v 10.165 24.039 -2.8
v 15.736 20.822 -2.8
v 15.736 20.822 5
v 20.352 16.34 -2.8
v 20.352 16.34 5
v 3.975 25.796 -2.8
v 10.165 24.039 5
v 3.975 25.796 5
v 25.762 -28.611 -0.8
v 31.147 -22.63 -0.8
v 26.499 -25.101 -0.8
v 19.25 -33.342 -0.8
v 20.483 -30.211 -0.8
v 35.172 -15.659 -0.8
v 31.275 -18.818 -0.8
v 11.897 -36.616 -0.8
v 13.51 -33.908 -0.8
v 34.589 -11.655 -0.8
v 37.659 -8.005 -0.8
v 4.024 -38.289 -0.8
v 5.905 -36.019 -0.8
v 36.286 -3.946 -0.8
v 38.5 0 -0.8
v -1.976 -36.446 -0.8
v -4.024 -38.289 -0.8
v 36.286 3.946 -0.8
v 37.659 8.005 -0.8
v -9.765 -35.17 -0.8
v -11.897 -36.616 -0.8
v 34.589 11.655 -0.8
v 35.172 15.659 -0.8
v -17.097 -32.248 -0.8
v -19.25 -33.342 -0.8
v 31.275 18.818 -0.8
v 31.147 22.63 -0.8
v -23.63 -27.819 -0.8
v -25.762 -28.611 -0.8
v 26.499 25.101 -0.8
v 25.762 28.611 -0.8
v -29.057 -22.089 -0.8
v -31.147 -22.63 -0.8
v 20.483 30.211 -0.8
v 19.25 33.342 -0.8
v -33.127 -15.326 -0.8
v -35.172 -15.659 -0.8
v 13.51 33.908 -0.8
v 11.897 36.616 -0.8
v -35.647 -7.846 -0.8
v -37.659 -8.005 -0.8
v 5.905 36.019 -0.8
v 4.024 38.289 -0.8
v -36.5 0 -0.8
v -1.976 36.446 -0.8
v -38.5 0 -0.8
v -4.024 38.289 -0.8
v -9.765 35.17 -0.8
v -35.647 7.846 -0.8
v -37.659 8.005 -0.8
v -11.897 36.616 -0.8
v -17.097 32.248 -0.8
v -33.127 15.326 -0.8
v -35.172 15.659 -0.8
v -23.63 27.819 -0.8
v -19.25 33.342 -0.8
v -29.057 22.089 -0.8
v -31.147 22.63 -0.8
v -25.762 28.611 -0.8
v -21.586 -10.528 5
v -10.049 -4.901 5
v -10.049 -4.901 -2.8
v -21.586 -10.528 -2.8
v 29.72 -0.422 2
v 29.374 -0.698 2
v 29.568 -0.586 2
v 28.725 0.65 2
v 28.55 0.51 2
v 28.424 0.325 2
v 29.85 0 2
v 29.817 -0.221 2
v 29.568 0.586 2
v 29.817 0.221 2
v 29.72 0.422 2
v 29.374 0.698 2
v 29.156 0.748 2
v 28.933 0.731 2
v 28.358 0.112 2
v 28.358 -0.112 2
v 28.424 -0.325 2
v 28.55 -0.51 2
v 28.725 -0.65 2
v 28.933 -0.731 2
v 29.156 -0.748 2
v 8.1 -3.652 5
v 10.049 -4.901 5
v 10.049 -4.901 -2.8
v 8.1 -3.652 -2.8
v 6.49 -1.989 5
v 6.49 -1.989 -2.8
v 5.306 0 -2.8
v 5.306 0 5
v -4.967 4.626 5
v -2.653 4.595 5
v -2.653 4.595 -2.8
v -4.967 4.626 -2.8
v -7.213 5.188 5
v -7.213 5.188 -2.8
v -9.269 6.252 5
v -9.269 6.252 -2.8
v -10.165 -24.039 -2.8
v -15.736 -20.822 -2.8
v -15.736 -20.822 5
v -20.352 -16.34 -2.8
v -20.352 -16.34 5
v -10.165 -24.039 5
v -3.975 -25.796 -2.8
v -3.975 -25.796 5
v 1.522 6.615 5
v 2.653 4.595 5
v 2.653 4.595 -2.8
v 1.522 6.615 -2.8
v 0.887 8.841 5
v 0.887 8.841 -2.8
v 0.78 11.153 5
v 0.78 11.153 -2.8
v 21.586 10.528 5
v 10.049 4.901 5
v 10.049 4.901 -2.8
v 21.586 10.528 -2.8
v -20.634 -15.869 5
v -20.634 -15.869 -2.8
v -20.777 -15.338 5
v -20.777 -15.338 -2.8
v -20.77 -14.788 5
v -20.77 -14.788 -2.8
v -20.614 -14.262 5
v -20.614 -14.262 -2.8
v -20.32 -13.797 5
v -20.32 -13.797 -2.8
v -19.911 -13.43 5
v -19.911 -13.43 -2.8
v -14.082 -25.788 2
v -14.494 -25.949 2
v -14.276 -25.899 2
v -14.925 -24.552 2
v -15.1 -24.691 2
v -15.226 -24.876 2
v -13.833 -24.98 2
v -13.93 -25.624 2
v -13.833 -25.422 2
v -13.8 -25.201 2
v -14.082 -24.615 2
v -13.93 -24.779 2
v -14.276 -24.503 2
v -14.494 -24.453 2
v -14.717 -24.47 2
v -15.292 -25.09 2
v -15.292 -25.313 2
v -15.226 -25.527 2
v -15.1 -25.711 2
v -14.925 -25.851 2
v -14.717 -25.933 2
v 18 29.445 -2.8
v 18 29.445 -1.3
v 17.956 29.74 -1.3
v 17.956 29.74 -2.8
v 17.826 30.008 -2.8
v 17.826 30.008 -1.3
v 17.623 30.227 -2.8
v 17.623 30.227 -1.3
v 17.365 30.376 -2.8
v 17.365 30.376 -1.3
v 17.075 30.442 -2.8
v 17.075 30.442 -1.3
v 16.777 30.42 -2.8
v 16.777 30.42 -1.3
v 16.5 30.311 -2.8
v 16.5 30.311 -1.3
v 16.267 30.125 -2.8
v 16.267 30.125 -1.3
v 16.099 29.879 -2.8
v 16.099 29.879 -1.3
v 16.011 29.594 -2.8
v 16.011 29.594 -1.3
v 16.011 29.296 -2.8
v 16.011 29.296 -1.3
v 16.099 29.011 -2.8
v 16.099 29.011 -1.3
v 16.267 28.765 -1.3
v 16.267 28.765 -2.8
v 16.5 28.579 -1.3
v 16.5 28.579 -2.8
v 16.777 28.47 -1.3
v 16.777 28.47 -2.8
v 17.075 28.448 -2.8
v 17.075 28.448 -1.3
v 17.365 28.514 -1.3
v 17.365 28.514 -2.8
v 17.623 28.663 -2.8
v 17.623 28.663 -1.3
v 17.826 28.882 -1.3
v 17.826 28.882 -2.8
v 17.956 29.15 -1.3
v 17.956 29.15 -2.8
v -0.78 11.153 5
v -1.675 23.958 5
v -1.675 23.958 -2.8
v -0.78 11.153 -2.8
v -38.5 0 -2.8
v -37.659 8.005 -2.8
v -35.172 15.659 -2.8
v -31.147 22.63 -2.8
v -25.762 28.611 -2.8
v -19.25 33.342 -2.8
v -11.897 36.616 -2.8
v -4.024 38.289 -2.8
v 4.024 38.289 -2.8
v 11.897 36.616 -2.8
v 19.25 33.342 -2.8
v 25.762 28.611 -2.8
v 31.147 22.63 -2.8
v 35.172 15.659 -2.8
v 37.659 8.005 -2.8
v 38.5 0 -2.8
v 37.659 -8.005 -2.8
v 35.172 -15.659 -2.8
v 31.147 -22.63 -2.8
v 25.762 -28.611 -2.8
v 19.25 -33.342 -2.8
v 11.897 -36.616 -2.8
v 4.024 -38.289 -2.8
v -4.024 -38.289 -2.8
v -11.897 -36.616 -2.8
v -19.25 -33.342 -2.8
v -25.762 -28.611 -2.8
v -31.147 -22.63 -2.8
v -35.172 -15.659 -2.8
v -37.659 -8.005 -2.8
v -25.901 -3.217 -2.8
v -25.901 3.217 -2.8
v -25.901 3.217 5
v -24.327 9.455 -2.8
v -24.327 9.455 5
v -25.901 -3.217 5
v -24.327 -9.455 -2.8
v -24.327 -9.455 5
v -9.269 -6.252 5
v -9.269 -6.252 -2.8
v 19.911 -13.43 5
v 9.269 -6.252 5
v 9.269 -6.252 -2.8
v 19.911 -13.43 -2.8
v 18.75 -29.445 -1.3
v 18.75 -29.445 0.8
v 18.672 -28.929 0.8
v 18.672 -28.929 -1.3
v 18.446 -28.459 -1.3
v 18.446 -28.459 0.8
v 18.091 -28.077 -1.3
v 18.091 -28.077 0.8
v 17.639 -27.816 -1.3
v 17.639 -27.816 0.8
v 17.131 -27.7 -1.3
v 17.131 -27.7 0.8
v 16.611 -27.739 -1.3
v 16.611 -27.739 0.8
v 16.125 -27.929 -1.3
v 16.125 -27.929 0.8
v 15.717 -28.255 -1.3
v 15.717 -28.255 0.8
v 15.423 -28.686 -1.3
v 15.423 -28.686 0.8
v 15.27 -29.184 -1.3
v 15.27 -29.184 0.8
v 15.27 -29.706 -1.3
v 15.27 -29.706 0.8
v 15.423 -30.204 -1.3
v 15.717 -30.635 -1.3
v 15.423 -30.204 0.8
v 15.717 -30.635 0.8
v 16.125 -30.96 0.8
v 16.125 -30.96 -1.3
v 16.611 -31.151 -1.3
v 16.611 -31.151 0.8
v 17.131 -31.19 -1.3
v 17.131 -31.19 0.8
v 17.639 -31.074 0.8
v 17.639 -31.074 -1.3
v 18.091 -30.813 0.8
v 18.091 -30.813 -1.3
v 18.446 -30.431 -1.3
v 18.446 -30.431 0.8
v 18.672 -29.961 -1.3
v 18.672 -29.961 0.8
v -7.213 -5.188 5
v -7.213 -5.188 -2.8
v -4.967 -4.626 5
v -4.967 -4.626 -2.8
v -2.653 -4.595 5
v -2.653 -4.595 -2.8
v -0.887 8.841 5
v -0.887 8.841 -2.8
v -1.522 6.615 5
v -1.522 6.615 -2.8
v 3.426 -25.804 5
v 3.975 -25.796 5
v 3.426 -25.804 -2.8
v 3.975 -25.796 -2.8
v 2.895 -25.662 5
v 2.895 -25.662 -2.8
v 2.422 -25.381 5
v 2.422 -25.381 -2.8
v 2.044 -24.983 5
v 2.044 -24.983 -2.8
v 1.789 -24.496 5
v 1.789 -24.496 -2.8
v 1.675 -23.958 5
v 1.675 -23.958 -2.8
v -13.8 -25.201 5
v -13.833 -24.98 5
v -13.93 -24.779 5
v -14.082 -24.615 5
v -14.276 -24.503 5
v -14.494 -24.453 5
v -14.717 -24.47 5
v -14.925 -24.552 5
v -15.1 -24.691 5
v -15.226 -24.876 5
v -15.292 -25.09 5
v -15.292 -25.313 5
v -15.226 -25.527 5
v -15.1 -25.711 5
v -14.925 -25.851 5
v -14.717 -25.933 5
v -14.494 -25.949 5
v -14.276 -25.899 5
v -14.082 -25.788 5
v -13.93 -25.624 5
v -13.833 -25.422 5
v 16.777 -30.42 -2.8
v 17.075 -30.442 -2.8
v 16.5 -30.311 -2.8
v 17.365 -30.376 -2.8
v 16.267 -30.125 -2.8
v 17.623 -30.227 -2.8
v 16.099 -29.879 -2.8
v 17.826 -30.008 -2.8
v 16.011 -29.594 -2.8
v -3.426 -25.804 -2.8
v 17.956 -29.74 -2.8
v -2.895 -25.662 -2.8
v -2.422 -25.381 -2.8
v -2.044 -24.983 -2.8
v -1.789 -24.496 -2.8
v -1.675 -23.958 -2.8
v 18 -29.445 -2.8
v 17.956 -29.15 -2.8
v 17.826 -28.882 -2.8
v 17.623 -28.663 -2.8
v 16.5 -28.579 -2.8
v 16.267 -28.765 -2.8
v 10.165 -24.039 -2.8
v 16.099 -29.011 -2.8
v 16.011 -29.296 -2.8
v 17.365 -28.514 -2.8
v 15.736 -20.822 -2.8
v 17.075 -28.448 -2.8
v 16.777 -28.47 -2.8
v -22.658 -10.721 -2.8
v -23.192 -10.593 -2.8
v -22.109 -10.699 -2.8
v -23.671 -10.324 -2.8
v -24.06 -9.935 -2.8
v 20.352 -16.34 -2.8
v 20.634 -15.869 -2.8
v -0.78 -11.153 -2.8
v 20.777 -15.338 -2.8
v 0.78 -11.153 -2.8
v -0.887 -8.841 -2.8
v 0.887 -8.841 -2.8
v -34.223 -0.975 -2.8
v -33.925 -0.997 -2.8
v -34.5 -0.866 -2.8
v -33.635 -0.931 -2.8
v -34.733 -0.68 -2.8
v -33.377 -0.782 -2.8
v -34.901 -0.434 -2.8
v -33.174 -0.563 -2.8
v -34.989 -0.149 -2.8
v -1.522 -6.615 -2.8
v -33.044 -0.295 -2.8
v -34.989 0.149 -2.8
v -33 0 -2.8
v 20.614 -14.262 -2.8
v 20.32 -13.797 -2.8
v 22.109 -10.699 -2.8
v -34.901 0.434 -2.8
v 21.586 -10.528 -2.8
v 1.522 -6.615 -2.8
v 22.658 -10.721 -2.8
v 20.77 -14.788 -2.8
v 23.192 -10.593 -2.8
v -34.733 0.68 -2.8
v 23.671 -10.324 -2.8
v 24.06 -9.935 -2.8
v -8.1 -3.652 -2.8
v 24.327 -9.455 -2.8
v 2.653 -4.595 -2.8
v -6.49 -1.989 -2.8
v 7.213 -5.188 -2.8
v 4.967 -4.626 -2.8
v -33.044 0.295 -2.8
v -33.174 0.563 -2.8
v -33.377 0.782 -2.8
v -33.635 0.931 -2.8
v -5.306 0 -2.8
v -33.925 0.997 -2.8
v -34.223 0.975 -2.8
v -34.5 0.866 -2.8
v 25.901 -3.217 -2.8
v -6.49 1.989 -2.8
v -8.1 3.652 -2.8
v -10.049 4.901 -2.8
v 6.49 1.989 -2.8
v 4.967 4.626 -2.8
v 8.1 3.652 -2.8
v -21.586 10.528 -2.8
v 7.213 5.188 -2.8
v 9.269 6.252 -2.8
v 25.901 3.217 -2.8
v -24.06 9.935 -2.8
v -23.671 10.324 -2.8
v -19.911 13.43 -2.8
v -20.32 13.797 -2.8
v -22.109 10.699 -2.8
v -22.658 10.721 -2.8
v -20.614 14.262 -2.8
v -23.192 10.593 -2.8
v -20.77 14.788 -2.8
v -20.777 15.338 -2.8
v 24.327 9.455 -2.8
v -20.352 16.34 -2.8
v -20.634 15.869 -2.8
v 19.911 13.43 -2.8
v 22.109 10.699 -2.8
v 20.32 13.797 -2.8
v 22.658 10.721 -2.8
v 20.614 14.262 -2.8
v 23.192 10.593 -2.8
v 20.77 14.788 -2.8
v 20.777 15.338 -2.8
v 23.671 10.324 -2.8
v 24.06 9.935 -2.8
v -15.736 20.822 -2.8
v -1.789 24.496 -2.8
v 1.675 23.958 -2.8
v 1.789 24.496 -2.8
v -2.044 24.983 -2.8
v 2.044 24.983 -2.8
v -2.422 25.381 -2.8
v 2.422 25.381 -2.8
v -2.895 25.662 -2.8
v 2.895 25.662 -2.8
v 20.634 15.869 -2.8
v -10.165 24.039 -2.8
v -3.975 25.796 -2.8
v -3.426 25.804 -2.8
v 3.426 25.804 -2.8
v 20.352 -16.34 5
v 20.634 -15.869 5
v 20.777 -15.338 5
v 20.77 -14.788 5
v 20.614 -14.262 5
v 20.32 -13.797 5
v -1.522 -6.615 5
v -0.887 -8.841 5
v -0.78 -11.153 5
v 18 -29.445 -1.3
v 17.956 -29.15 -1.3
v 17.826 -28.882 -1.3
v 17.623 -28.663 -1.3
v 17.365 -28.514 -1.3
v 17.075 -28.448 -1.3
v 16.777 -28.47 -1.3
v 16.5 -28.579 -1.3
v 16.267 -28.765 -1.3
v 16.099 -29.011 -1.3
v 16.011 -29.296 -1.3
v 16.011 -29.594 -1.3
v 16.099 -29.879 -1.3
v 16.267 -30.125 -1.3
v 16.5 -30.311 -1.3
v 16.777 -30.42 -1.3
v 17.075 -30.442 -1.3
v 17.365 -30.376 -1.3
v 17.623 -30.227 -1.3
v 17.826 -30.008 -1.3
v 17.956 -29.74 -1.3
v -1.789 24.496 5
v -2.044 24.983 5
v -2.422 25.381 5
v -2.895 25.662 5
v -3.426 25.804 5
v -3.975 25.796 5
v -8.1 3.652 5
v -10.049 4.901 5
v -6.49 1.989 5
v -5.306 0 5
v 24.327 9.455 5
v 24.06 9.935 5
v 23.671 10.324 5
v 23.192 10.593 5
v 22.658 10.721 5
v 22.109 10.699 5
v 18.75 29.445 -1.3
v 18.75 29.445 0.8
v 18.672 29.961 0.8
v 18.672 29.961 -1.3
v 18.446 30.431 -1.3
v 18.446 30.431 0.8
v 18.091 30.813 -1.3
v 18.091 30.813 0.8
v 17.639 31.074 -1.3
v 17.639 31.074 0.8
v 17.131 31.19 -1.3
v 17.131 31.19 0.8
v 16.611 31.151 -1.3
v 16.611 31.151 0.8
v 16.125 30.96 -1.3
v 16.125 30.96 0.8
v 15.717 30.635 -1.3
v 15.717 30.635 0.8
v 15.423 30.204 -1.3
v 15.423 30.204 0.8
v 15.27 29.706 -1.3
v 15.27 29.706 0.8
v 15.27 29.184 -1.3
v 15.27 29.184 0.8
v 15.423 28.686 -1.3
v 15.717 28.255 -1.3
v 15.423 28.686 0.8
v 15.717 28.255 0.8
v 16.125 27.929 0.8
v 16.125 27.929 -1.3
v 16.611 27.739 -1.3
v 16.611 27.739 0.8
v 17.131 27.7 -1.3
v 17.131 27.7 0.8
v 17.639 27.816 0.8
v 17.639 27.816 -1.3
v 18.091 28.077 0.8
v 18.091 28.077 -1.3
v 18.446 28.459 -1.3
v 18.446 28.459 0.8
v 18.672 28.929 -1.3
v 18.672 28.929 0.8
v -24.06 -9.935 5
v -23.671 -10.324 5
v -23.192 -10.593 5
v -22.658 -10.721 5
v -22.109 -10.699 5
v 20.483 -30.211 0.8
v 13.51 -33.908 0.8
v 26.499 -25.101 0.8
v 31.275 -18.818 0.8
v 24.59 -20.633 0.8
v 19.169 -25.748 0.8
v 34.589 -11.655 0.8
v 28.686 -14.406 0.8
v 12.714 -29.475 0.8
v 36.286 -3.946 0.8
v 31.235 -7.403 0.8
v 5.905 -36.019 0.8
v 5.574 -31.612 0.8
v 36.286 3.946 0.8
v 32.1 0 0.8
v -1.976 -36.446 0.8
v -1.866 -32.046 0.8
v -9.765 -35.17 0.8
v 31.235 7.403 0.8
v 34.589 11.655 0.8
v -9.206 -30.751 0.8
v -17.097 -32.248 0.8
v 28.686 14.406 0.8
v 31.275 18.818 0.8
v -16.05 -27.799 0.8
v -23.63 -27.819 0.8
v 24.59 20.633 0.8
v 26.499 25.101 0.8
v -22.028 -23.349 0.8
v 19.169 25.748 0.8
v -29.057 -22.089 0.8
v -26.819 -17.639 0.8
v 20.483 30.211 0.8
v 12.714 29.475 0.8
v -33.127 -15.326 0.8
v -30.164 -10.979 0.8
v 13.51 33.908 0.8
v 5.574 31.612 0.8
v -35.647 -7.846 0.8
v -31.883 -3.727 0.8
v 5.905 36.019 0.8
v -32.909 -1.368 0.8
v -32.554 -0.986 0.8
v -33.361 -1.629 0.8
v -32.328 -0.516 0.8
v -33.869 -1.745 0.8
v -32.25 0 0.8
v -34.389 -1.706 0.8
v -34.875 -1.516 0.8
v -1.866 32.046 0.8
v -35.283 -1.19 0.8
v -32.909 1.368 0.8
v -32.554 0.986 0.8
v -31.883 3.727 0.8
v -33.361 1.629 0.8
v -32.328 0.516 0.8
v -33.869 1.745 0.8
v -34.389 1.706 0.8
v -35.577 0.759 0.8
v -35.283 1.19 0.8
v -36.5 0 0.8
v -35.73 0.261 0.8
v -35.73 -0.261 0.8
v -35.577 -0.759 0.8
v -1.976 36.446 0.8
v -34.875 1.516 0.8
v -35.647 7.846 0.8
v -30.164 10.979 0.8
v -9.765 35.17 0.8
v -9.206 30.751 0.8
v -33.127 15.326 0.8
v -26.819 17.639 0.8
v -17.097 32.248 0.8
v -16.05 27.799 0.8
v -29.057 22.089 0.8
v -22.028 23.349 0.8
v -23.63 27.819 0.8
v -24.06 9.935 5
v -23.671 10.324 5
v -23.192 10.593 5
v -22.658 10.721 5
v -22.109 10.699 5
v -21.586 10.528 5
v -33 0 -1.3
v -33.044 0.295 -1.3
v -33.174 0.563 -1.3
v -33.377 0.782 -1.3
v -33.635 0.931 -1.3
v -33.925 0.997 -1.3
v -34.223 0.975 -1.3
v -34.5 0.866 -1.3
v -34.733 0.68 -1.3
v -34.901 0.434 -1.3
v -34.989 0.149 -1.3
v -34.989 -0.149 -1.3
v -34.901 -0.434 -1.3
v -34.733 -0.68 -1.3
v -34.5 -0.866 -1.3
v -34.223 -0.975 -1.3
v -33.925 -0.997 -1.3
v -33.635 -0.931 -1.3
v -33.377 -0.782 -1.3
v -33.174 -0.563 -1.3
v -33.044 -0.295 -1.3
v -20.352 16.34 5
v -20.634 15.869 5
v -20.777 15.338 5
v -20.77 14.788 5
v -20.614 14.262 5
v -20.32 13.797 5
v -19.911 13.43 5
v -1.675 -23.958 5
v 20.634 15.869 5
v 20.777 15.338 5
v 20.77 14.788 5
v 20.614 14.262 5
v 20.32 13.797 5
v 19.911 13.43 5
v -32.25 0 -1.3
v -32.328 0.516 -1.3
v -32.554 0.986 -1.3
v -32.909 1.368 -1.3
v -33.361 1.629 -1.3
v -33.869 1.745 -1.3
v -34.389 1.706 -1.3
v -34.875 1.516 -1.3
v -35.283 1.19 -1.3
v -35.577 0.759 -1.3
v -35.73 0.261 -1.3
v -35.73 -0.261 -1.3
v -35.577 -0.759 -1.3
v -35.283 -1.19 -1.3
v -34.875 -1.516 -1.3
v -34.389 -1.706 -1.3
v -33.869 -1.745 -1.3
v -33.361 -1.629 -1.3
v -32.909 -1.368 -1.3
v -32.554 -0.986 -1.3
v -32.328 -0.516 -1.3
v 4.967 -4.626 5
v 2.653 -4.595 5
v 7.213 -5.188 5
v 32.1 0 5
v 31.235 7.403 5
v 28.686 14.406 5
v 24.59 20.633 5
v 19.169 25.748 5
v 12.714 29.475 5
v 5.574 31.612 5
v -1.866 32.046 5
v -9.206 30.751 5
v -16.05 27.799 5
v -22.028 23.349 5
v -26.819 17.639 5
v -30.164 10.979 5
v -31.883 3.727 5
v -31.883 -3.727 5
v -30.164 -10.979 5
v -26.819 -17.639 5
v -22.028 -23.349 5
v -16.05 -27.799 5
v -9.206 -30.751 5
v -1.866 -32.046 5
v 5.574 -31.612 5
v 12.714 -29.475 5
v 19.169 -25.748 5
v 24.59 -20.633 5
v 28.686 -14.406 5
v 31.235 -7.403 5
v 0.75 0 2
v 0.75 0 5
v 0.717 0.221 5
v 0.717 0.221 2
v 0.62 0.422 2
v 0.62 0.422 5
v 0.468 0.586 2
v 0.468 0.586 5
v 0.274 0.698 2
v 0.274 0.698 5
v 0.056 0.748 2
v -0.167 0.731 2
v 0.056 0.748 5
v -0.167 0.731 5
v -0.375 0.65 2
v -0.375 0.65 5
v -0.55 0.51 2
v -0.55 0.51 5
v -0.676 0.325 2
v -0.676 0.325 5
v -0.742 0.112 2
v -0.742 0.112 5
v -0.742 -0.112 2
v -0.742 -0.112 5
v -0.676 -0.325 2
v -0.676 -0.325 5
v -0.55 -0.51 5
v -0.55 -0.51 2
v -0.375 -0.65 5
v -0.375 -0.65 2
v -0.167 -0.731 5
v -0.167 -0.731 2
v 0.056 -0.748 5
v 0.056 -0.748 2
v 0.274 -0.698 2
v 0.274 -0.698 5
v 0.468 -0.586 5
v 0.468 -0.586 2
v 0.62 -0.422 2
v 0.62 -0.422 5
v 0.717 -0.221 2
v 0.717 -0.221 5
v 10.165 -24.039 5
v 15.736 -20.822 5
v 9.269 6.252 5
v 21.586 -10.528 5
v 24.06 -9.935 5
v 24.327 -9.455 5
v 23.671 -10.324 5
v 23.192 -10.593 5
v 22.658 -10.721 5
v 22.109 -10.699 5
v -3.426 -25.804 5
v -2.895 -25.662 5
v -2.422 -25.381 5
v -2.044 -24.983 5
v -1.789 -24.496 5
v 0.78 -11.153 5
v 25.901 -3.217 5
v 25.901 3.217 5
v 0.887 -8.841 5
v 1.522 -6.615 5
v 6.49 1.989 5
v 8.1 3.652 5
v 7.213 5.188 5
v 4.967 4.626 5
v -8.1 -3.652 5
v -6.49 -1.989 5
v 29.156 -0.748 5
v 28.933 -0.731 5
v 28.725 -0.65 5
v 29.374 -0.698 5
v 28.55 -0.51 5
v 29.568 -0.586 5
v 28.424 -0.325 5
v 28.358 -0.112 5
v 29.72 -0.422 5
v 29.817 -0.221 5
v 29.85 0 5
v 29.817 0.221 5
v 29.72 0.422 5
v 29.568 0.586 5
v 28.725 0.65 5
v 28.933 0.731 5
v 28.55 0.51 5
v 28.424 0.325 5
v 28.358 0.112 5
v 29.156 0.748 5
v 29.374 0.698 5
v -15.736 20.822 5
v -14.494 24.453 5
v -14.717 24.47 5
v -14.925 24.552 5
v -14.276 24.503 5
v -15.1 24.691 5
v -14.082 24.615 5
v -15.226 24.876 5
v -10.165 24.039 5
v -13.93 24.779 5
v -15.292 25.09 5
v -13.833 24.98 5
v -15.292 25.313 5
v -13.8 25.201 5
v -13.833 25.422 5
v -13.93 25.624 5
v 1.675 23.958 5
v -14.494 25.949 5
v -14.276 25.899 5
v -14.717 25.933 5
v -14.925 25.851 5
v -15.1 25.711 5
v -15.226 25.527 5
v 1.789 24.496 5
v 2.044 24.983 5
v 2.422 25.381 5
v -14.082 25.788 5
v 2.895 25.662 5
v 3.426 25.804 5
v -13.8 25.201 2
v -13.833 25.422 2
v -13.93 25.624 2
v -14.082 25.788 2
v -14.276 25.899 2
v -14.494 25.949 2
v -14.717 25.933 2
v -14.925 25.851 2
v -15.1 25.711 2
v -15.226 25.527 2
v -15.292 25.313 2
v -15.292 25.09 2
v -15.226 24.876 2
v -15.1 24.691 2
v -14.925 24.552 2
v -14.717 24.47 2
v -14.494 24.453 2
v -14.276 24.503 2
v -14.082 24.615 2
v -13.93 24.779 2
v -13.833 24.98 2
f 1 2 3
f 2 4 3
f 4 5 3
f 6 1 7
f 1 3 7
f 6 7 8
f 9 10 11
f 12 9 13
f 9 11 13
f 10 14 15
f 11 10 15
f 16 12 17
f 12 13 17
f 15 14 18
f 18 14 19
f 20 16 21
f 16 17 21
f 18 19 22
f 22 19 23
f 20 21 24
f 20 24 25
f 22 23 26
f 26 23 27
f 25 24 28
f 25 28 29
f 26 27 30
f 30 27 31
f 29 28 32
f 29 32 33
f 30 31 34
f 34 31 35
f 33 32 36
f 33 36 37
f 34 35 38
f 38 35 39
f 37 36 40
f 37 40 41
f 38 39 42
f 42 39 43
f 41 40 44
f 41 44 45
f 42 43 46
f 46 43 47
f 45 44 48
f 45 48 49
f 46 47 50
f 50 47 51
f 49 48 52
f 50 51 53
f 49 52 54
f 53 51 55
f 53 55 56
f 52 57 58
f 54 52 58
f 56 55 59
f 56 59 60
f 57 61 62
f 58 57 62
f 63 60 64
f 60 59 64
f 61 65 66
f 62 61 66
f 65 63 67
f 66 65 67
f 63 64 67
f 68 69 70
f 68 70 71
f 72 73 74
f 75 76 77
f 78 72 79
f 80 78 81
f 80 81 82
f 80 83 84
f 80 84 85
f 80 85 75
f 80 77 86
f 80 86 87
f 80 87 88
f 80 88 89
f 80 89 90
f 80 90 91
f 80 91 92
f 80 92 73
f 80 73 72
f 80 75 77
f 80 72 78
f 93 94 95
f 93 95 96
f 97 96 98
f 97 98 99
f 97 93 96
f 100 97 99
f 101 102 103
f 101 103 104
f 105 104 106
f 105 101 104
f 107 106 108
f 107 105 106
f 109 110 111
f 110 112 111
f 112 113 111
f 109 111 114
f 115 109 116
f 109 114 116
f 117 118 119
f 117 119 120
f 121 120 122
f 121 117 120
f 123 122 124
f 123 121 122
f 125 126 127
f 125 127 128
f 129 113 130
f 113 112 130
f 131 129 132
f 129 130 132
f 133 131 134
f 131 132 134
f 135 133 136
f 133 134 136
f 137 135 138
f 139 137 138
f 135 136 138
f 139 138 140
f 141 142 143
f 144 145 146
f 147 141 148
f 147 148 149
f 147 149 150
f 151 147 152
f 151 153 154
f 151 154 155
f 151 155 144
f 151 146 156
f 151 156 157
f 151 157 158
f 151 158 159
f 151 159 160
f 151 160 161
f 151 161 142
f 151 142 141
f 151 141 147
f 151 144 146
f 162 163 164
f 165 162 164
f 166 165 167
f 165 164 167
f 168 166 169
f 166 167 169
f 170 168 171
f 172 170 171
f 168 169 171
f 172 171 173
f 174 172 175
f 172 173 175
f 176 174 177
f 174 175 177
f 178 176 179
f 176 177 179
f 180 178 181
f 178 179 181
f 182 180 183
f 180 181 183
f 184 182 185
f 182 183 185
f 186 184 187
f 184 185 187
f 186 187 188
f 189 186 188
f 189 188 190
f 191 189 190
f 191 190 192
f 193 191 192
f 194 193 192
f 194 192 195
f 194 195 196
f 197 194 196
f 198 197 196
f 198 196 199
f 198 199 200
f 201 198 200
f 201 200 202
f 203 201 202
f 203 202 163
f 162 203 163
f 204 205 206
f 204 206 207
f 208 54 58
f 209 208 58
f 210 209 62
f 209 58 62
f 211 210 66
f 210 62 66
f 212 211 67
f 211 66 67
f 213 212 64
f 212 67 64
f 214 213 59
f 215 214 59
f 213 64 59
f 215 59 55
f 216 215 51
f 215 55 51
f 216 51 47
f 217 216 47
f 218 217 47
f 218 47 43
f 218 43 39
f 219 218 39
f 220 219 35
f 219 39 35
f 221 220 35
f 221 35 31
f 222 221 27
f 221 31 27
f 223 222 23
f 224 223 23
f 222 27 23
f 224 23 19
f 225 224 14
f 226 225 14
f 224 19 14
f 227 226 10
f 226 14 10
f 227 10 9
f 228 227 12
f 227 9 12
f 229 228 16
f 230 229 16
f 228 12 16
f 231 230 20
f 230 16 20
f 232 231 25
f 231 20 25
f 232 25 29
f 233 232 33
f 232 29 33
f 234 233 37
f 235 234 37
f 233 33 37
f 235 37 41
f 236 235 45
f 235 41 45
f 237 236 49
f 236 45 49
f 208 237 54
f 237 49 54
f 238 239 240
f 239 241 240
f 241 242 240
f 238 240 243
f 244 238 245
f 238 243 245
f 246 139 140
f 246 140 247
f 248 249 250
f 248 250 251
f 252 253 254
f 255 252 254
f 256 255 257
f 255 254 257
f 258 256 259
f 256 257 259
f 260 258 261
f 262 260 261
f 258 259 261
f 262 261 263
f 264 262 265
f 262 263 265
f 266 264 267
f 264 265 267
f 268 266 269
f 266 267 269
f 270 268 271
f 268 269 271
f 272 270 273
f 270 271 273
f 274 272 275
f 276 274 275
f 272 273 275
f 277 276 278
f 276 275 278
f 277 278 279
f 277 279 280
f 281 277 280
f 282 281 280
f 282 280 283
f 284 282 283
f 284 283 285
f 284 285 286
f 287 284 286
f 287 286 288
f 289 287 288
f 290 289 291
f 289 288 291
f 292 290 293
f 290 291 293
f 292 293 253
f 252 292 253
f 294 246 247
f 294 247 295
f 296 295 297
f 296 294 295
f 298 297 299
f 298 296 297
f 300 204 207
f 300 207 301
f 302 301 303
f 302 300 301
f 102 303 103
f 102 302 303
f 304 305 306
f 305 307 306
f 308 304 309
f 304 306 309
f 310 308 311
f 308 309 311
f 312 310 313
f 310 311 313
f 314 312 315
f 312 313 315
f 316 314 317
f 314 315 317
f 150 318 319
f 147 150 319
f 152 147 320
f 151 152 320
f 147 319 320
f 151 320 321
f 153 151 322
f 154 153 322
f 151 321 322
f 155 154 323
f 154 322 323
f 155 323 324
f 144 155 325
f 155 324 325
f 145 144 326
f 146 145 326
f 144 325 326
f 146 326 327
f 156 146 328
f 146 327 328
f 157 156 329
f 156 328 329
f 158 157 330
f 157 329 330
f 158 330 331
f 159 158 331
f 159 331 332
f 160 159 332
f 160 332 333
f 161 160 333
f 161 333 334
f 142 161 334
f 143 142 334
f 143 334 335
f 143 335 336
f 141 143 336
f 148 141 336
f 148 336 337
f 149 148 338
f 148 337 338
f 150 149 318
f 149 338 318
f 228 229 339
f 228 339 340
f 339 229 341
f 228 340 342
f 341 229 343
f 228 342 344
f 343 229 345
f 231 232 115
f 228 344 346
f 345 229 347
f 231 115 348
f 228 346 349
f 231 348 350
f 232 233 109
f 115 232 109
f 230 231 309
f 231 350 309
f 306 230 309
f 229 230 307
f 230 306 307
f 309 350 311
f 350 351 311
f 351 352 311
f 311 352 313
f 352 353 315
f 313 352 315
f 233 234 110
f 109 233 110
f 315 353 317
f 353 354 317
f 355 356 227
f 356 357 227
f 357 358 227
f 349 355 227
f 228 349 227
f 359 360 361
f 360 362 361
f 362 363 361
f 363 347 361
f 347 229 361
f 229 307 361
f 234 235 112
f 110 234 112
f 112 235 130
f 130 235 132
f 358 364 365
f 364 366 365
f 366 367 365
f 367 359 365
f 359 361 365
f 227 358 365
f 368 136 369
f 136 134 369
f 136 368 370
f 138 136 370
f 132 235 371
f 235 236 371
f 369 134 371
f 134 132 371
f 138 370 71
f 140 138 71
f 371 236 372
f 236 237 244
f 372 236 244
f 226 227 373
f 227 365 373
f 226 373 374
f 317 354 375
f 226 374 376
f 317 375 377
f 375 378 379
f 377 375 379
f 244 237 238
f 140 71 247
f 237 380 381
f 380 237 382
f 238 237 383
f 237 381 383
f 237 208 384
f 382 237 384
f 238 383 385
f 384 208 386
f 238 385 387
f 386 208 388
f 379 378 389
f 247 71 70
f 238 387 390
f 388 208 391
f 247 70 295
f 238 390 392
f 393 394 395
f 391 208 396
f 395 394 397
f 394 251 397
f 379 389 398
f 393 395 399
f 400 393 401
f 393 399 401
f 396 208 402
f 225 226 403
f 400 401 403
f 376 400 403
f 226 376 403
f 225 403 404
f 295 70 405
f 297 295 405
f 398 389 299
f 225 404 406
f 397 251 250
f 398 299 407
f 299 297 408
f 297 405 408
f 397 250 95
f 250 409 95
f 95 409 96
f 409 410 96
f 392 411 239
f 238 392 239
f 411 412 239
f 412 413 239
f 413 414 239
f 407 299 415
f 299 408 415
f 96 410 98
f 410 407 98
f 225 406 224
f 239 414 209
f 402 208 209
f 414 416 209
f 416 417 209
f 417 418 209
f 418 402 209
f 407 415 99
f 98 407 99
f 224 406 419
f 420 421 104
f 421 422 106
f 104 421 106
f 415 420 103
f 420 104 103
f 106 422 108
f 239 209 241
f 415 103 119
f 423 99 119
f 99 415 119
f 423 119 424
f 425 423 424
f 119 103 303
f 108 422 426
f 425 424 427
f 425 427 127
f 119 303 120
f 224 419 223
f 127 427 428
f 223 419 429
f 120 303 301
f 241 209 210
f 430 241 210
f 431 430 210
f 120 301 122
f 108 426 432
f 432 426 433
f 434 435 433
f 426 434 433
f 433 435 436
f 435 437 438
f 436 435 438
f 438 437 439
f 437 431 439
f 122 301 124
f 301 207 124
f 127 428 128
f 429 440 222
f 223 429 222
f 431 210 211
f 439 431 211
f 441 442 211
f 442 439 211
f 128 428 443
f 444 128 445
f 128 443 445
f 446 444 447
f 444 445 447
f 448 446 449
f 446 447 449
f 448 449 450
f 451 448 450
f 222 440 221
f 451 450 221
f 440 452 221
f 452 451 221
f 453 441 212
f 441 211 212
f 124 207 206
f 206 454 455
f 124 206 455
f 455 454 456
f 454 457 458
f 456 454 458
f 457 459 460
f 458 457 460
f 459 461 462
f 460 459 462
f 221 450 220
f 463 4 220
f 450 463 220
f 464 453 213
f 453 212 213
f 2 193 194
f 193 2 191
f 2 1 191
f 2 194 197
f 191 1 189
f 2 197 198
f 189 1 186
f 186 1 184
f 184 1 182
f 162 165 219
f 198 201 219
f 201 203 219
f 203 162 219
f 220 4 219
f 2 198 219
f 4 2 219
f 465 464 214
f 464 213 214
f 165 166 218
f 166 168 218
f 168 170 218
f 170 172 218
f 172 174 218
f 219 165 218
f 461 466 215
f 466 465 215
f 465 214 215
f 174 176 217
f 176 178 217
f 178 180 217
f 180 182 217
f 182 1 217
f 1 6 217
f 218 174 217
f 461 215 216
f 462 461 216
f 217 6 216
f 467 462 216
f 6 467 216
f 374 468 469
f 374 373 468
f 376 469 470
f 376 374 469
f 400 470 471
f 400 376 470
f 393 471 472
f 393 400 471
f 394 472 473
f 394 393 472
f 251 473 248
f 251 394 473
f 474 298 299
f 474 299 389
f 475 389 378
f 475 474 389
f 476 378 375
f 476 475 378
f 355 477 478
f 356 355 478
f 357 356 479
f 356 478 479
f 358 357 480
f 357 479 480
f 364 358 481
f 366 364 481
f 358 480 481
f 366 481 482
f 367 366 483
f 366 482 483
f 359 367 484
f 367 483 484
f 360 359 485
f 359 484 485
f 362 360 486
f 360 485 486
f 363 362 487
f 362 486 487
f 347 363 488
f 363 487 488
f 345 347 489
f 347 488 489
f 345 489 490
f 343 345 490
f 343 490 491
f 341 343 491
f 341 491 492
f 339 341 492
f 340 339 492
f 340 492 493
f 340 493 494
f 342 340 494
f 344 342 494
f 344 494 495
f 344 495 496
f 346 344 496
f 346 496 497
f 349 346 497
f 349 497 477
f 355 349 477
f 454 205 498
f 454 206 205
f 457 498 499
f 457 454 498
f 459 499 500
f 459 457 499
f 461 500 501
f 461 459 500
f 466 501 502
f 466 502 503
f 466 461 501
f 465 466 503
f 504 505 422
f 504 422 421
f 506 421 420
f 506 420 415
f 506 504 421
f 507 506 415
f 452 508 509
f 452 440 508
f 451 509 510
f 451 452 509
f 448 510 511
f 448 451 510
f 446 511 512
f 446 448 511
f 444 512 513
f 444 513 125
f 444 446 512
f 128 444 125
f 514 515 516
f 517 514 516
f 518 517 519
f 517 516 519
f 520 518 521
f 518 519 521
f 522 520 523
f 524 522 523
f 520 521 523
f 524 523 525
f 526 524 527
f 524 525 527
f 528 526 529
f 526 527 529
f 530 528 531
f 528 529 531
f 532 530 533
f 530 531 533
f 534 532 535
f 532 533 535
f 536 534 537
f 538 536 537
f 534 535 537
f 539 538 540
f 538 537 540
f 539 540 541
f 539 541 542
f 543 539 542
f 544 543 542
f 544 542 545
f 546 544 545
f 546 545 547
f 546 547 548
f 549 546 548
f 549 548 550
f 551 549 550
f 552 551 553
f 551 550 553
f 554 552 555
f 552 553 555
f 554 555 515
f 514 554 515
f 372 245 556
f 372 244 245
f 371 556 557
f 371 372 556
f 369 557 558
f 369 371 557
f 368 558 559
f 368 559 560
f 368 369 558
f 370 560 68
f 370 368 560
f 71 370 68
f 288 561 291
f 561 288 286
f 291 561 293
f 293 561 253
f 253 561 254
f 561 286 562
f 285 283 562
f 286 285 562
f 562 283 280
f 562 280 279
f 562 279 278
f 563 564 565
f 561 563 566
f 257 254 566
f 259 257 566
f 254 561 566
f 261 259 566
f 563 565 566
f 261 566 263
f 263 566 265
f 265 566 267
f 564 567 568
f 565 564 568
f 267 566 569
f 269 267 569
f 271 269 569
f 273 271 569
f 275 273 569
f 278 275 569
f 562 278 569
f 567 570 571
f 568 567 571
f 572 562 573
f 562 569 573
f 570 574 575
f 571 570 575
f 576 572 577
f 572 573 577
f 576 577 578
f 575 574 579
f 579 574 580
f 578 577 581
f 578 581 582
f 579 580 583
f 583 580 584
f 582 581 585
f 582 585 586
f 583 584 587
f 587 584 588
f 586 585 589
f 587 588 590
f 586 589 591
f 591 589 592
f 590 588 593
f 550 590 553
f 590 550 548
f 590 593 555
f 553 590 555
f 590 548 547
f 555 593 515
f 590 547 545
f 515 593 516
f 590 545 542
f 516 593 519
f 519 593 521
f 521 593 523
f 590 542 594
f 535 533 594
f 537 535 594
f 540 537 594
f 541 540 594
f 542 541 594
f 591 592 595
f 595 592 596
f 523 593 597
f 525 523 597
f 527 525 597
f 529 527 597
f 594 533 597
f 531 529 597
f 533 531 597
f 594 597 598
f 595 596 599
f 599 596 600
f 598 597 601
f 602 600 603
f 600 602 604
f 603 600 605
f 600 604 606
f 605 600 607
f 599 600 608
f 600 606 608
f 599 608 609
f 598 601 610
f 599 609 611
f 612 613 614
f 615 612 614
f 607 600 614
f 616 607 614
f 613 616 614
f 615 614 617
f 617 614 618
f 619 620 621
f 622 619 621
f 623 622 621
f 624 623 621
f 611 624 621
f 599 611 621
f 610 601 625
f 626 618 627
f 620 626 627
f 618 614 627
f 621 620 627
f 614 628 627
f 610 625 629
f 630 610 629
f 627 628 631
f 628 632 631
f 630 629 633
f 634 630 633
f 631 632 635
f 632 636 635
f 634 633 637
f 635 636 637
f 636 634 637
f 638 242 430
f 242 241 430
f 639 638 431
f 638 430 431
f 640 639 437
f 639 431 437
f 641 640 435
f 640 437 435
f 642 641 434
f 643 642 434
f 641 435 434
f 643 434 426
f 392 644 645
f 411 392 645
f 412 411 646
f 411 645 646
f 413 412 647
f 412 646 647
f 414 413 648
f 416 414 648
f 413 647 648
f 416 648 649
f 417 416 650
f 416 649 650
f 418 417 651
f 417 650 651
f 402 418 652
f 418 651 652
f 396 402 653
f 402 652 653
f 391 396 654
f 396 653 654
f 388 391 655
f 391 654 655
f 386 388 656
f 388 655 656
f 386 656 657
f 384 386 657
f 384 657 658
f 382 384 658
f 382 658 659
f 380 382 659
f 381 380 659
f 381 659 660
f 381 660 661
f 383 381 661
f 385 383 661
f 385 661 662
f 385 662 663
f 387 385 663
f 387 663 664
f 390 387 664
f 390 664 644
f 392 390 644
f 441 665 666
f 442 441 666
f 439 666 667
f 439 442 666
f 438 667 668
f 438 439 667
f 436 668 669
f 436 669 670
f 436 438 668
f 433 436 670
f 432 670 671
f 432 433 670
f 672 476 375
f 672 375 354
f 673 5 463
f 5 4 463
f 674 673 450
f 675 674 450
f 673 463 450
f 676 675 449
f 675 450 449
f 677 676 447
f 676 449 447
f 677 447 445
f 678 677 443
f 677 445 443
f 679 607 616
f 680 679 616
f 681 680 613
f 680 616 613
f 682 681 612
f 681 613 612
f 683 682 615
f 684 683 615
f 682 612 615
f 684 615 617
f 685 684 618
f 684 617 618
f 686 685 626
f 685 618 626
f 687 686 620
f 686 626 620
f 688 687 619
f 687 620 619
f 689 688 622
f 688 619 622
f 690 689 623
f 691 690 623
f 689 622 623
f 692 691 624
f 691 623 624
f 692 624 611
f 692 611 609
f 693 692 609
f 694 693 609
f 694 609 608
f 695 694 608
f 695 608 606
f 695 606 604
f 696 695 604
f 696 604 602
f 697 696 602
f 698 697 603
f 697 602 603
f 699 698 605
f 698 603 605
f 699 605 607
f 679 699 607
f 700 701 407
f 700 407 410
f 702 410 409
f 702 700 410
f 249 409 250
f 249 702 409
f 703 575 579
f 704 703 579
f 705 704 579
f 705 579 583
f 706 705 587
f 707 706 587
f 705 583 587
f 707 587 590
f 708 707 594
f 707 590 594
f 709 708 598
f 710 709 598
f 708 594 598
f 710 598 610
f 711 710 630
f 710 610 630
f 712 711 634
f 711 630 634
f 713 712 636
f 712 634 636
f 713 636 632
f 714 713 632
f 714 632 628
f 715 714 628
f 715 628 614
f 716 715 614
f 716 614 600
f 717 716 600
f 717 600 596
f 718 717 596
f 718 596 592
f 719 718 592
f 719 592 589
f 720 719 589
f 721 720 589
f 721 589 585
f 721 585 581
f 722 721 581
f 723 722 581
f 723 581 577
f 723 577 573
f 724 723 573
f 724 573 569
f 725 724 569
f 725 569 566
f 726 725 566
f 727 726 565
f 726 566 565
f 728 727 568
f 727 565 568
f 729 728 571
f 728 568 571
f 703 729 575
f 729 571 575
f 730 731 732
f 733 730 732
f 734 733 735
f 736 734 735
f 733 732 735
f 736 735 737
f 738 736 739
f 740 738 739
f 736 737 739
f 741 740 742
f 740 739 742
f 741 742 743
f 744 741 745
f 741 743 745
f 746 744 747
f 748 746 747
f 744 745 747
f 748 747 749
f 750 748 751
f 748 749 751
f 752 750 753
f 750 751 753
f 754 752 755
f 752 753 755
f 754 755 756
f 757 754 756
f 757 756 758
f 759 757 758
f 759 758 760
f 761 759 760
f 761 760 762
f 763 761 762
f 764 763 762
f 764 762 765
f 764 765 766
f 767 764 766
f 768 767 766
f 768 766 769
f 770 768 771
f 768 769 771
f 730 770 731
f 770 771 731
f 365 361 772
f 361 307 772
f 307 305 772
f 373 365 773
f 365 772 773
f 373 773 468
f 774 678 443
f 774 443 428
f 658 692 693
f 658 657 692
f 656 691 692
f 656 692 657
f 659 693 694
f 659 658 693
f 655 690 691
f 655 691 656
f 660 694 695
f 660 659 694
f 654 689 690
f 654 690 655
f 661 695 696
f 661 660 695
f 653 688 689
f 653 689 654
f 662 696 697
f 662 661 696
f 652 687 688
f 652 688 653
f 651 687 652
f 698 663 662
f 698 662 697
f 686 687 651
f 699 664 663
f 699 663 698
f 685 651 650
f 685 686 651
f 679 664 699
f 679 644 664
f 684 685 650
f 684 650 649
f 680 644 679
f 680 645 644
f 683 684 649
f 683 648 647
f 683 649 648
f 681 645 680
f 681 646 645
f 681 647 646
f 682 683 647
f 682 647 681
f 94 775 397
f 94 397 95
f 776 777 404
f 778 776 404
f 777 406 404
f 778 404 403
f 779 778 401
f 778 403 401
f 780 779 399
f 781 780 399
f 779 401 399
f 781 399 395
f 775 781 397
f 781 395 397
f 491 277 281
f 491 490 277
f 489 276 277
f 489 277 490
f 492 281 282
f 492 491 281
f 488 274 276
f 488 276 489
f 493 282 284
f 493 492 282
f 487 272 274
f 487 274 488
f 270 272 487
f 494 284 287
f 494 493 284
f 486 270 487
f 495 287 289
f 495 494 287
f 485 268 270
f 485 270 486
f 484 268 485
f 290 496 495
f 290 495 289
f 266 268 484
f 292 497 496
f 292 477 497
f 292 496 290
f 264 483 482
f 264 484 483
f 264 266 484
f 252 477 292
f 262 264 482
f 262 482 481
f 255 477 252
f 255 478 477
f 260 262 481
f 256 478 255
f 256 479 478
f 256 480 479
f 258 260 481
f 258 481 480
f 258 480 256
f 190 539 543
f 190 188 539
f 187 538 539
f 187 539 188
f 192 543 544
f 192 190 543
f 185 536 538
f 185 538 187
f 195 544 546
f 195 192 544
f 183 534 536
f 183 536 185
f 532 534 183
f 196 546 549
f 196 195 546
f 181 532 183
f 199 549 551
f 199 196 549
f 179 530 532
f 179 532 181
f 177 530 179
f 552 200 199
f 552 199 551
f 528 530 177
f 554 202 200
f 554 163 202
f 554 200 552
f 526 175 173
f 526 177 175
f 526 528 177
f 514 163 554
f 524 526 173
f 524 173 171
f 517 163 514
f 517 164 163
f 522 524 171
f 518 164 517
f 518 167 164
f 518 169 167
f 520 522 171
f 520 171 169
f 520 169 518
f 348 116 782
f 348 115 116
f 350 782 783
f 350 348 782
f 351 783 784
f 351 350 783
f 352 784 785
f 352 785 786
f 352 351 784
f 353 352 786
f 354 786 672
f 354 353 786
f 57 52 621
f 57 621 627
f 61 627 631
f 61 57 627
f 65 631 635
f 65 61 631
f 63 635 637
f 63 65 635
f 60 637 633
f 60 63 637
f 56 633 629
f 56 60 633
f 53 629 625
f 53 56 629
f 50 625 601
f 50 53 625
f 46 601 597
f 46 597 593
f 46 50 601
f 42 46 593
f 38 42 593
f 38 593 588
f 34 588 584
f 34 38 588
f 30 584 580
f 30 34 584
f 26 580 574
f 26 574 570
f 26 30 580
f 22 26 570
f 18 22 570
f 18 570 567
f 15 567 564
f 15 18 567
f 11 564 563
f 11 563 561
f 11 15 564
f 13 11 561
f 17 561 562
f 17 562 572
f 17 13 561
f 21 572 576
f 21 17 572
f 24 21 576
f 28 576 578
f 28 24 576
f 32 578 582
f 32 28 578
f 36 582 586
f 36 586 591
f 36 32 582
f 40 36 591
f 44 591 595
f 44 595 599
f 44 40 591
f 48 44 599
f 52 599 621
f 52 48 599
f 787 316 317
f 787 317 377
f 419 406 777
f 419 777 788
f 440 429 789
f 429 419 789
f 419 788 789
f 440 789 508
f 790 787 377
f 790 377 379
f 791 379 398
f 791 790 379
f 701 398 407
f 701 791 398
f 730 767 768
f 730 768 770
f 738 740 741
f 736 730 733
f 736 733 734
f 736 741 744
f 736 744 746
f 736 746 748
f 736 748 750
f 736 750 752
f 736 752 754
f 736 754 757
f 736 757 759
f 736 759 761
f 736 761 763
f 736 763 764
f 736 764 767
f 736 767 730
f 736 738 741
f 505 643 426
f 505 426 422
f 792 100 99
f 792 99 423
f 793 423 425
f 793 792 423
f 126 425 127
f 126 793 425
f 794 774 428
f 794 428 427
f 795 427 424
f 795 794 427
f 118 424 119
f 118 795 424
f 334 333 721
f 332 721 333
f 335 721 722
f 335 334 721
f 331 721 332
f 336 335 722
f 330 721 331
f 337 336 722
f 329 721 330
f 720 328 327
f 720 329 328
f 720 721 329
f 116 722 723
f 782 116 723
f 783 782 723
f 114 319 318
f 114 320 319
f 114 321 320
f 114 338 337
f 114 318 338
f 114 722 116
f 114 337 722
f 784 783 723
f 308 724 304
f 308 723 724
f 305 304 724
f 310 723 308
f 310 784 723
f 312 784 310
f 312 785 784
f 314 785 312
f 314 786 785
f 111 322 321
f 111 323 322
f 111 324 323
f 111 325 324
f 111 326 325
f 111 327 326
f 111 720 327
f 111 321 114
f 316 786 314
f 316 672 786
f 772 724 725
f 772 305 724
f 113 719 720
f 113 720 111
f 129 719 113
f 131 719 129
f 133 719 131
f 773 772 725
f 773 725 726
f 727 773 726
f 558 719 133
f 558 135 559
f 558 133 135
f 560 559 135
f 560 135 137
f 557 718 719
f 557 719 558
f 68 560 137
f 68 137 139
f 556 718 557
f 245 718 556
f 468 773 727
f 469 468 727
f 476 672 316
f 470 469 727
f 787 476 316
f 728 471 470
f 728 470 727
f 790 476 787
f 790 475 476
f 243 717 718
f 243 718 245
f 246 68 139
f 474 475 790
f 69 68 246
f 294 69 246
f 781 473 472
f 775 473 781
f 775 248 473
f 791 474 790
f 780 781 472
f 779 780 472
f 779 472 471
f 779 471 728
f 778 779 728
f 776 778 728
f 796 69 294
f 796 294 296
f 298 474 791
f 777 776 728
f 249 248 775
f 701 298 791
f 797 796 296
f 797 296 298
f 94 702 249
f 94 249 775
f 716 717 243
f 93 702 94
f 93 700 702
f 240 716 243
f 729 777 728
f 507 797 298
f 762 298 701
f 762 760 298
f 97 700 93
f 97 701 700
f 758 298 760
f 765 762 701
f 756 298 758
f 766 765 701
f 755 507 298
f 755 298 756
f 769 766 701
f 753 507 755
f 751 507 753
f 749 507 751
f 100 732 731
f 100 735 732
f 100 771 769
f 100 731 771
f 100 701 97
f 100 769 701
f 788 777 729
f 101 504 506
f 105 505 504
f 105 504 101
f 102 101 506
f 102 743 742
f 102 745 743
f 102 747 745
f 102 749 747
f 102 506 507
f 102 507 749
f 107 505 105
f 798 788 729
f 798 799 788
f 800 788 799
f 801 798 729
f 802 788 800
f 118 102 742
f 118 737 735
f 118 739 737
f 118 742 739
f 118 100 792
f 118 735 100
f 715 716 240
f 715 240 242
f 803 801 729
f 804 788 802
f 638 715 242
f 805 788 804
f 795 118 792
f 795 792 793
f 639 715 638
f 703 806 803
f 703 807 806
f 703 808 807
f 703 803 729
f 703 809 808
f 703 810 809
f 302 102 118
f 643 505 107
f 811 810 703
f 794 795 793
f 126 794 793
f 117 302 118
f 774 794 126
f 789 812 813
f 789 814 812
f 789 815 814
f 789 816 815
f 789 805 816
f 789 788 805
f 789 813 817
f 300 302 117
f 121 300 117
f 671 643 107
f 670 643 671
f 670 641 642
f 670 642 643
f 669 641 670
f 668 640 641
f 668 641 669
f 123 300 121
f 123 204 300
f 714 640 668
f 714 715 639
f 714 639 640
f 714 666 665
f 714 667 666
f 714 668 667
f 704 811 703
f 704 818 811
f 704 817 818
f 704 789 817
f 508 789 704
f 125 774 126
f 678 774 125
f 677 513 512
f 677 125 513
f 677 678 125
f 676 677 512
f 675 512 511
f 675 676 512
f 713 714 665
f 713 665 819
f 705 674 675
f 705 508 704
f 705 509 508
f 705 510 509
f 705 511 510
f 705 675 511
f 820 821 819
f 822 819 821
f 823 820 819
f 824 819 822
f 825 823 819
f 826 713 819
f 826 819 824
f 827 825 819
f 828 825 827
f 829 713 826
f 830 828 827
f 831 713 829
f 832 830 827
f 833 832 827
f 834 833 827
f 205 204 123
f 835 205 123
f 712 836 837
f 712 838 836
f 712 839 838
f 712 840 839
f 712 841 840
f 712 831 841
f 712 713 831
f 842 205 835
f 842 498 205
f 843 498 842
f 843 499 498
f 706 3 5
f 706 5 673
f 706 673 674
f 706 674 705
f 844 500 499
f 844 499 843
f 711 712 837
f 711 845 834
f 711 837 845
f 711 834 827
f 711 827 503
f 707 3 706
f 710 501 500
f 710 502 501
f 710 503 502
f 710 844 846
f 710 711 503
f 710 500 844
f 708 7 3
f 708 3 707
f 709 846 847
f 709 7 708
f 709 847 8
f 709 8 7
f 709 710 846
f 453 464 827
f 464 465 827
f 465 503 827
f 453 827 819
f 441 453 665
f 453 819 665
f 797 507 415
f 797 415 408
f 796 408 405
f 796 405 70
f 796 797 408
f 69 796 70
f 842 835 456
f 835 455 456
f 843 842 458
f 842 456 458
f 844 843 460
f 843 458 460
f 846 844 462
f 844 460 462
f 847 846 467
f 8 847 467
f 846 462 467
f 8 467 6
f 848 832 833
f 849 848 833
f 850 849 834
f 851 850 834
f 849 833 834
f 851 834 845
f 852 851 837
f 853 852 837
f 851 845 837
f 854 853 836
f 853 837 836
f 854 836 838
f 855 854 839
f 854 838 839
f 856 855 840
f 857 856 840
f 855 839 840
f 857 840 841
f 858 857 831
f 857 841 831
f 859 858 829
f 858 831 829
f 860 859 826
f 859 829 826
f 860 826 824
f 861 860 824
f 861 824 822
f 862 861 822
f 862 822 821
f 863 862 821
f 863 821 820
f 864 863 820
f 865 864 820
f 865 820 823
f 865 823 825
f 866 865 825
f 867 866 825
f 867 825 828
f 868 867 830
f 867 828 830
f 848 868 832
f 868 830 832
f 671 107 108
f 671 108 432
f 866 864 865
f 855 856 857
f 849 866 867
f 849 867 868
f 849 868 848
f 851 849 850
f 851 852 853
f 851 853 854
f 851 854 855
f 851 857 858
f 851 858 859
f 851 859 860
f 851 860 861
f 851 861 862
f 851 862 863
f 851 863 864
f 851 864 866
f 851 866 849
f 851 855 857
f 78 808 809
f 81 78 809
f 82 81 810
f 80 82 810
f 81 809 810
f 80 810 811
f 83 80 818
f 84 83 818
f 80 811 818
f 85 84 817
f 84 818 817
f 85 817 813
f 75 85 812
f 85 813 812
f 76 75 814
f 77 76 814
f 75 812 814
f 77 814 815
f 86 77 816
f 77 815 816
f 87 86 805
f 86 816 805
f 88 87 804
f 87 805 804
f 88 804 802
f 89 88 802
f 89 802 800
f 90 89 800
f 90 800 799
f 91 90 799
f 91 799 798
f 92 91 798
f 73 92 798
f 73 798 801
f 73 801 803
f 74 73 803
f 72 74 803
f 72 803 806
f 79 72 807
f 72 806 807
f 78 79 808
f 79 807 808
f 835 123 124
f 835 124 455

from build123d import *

# Parameters (mm, degrees)
SKETCH_1_R                       = 32.1
EXTRUDE_1_DEPTH                  = 5
EXTRUDE_START                    = 0.8
SKETCH_2_R                       = 36.5
EXTRUDE_2_DEPTH                  = 1.6
SKETCH_3_R                       = 38.5
EXTRUDE_3_DEPTH                  = 2
SKETCH_4_R                       = 26.1
CUT_EXTRUDE_1_DEPTH              = 56.003090822
SKETCH_4_3_R                     = 5
EXTRUDE_4_DEPTH                  = 7.8
EXTRUDE_5_DEPTH                  = 7.8
FILLET_6_R                       = 2
PATTERN_CIRCULAR_2_COUNT         = 6
FILLET_6_OF_PATTERN_CIRCULAR_2_R = 2
FILLET_7_R                       = 10
SKETCH_6_R                       = 0.75
CUT_EXTRUDE_2_DEPTH              = 3
SKETCH_8_R                       = 1
CUT_EXTRUDE_4_DEPTH              = 55.608973622
SKETCH_8_3_R                     = 1.75
CUT_EXTRUDE_5_DEPTH              = 2.1


with BuildPart() as part:
    # 草图1 → 凸台-拉伸1 (new body)
    with BuildSketch(Plane.XY):
        Circle(SKETCH_1_R)
    extrude(amount=EXTRUDE_1_DEPTH)

    # 草图2 → 凸台-拉伸2 (add)
    with BuildSketch(Plane(origin=(0, 0, 0), x_dir=(-1, 0, 0), z_dir=(0, 0, -1)).offset(EXTRUDE_START)):
        Circle(SKETCH_2_R)
    extrude(amount=-EXTRUDE_2_DEPTH)

    # 草图3 → 凸台-拉伸3 (add)
    with BuildSketch(Plane(origin=(0, 0, -0.8), x_dir=(-1, 0, 0), z_dir=(0, 0, -1))):
        Circle(SKETCH_3_R)
    extrude(amount=EXTRUDE_3_DEPTH)

    # 草图4 → 切除-拉伸1 (cut, through all)
    with BuildSketch(Plane.XY.offset(5)):
        Circle(SKETCH_4_R)
    extrude(amount=-CUT_EXTRUDE_1_DEPTH, mode=Mode.SUBTRACT)



with BuildPart() as body_2:
    # 草图4<3> → 凸台-拉伸4 (new, through all)
    with BuildSketch(Plane.XY.offset(5)):
        Circle(SKETCH_4_3_R)
    extrude(amount=-EXTRUDE_4_DEPTH)


with BuildPart() as part_1:
    add(part.part)

    add(body_2.part)  # 凸台-拉伸5 merges body 2
    # 草图4<4> → 凸台-拉伸5 (add, through all)
    with BuildSketch(Plane.XY.offset(5)):
        with BuildLine():
            Line((-1.820643965, 26.036421712), (-0.348782369, 4.987820251))
            ThreePointArc((-0.348782369, 4.987820251), (0, 5), (0.348782369, 4.987820251))
            Line((0.348782369, 4.987820251), (1.820643965, 26.036421712))
            ThreePointArc((1.820643965, 26.036421712), (0, 26.1), (-1.820643965, 26.036421712))
        make_face()
    extrude_5 = extrude(amount=-EXTRUDE_5_DEPTH)

    # 圆角6
    fillet_6_edges = [part_1.edges().sort_by_distance(p)[0] for p in [
        (1.820643965, 26.036421712, 1.1),
        (-1.820643965, 26.036421712, 1.1),
    ]]
    fillet(fillet_6_edges, radius=FILLET_6_R)

    # 阵列(圆周)2: 凸台-拉伸5 ×6 about axis
    pattern_circular_2_axis = Axis((0, 0, 0), (0, 0, 1))
    for i in range(1, PATTERN_CIRCULAR_2_COUNT):
        add(extrude_5.rotate(pattern_circular_2_axis, i * 360 / PATTERN_CIRCULAR_2_COUNT))

    # 圆角6 of 阵列(圆周)2
    fillet_6_of_pattern_circular_2_edges = [part_1.edges().sort_by_distance(p)[0] for p in [
        (-21.637880644, 14.594934781, 1.1),
        (-23.458524608, 11.441486931, 1.1),
        (-23.458524608, -11.441486931, 1.1),
        (-21.637880644, -14.594934781, 1.1),
        (-1.820643965, -26.036421712, 1.1),
        (1.820643965, -26.036421712, 1.1),
        (21.637880644, -14.594934781, 1.1),
        (23.458524608, -11.441486931, 1.1),
        (23.458524608, 11.441486931, 1.1),
        (21.637880644, 14.594934781, 1.1),
    ]]
    fillet(fillet_6_of_pattern_circular_2_edges, radius=FILLET_6_OF_PATTERN_CIRCULAR_2_R)

    # 圆角7
    # the kernel refuses this fillet: 10 mm, written as the material it adds along each edge
    with BuildSketch(Plane(origin=(-4.493970231, -2.191855734, 5), x_dir=(-0.8987940462991628, -0.4383711467890857, 0), z_dir=(0, 0, -1)), Plane(origin=(-0.348782369, -4.987820251, 5), x_dir=(-0.06975647374411581, -0.9975640502598249, 0), z_dir=(0, 0, -1)), Plane(origin=(4.145187863, -2.795964517, 5), x_dir=(0.8290375725550467, -0.5591929034707394, 0), z_dir=(0, 0, -1)), Plane(origin=(4.493970231, 2.191855734, 5), x_dir=(0.8987940462991627, 0.43837114678908606, 0), z_dir=(0, 0, -1)), Plane(origin=(0.348782369, 4.987820251, 5), x_dir=(0.0697564737441158, 0.9975640502598249, 0), z_dir=(0, 0, -1)), Plane(origin=(-4.145187863, 2.795964517, 5), x_dir=(-0.8290375725550471, 0.5591929034707388, 0), z_dir=(0, 0, -1))) as fillet_7_piece_1:
        with BuildLine():
            CenterArc((6.180339887, 10), FILLET_7_R, 221.810314896, 48.189685104)
            ThreePointArc((-1.273220038, 3.333333333), (-0.329138205, 1.784110449), (0, 0))
            Line((0, 0), (6.180339887, 0))
        make_face()
    extrude(amount=7.8)
    with BuildSketch(Plane(origin=(-4.145187863, -2.795964517, 5), x_dir=(-0.8290375725550488, -0.5591929034707364, 0), z_dir=(0, 0, -1)), Plane(origin=(0.348782369, -4.987820251, 5), x_dir=(0.06975647374411298, -0.9975640502598251, 0), z_dir=(0, 0, -1)), Plane(origin=(4.493970231, -2.191855734, 5), x_dir=(0.8987940462991613, -0.4383711467890891, 0), z_dir=(0, 0, -1)), Plane(origin=(4.145187863, 2.795964517, 5), x_dir=(0.8290375725550484, 0.5591929034707368, 0), z_dir=(0, 0, -1)), Plane(origin=(-0.348782369, 4.987820251, 5), x_dir=(-0.0697564737441132, 0.9975640502598251, 0), z_dir=(0, 0, -1)), Plane(origin=(-4.493970231, 2.191855734, 5), x_dir=(-0.8987940462991615, 0.43837114678908873, 0), z_dir=(0, 0, -1))) as fillet_7_piece_2:
        with BuildLine():
            CenterArc((6.180339887, -10), FILLET_7_R, 90, 48.189685104)
            ThreePointArc((-1.273220038, -3.333333333), (-0.329138205, -1.784110449), (0, 0))
            Line((0, 0), (6.180339887, 0))
        make_face()
    extrude(amount=7.8)

    # 草图6 → 切除-拉伸2 (cut)
    with BuildSketch(Plane.XY.offset(5)):
        Circle(SKETCH_6_R)
        with Locations((-14.55, 25.20133925)):
            Circle(SKETCH_6_R)
        with Locations((29.1, 0)):
            Circle(SKETCH_6_R)
        with Locations((-14.55, -25.20133925)):
            Circle(SKETCH_6_R)
    extrude(amount=-CUT_EXTRUDE_2_DEPTH, mode=Mode.SUBTRACT)

    # 草图8 → 切除-拉伸4 (cut, through all)
    with BuildSketch(Plane.XY.offset(0.8)):
        with Locations((17, 29.444863729)):
            Circle(SKETCH_8_R)
        with Locations((-34, 0)):
            Circle(SKETCH_8_R)
        with Locations((17, -29.444863729)):
            Circle(SKETCH_8_R)
    extrude(amount=-CUT_EXTRUDE_4_DEPTH, mode=Mode.SUBTRACT)

    # 草图8<3> → 切除-拉伸5 (cut)
    with BuildSketch(Plane.XY.offset(0.8)):
        with Locations((-34, 0)):
            Circle(SKETCH_8_3_R)
        with Locations((17, 29.444863729)):
            Circle(SKETCH_8_3_R)
        with Locations((17, -29.444863729)):
            Circle(SKETCH_8_3_R)
    extrude(amount=-CUT_EXTRUDE_5_DEPTH, mode=Mode.SUBTRACT)


solid = part_1.part
